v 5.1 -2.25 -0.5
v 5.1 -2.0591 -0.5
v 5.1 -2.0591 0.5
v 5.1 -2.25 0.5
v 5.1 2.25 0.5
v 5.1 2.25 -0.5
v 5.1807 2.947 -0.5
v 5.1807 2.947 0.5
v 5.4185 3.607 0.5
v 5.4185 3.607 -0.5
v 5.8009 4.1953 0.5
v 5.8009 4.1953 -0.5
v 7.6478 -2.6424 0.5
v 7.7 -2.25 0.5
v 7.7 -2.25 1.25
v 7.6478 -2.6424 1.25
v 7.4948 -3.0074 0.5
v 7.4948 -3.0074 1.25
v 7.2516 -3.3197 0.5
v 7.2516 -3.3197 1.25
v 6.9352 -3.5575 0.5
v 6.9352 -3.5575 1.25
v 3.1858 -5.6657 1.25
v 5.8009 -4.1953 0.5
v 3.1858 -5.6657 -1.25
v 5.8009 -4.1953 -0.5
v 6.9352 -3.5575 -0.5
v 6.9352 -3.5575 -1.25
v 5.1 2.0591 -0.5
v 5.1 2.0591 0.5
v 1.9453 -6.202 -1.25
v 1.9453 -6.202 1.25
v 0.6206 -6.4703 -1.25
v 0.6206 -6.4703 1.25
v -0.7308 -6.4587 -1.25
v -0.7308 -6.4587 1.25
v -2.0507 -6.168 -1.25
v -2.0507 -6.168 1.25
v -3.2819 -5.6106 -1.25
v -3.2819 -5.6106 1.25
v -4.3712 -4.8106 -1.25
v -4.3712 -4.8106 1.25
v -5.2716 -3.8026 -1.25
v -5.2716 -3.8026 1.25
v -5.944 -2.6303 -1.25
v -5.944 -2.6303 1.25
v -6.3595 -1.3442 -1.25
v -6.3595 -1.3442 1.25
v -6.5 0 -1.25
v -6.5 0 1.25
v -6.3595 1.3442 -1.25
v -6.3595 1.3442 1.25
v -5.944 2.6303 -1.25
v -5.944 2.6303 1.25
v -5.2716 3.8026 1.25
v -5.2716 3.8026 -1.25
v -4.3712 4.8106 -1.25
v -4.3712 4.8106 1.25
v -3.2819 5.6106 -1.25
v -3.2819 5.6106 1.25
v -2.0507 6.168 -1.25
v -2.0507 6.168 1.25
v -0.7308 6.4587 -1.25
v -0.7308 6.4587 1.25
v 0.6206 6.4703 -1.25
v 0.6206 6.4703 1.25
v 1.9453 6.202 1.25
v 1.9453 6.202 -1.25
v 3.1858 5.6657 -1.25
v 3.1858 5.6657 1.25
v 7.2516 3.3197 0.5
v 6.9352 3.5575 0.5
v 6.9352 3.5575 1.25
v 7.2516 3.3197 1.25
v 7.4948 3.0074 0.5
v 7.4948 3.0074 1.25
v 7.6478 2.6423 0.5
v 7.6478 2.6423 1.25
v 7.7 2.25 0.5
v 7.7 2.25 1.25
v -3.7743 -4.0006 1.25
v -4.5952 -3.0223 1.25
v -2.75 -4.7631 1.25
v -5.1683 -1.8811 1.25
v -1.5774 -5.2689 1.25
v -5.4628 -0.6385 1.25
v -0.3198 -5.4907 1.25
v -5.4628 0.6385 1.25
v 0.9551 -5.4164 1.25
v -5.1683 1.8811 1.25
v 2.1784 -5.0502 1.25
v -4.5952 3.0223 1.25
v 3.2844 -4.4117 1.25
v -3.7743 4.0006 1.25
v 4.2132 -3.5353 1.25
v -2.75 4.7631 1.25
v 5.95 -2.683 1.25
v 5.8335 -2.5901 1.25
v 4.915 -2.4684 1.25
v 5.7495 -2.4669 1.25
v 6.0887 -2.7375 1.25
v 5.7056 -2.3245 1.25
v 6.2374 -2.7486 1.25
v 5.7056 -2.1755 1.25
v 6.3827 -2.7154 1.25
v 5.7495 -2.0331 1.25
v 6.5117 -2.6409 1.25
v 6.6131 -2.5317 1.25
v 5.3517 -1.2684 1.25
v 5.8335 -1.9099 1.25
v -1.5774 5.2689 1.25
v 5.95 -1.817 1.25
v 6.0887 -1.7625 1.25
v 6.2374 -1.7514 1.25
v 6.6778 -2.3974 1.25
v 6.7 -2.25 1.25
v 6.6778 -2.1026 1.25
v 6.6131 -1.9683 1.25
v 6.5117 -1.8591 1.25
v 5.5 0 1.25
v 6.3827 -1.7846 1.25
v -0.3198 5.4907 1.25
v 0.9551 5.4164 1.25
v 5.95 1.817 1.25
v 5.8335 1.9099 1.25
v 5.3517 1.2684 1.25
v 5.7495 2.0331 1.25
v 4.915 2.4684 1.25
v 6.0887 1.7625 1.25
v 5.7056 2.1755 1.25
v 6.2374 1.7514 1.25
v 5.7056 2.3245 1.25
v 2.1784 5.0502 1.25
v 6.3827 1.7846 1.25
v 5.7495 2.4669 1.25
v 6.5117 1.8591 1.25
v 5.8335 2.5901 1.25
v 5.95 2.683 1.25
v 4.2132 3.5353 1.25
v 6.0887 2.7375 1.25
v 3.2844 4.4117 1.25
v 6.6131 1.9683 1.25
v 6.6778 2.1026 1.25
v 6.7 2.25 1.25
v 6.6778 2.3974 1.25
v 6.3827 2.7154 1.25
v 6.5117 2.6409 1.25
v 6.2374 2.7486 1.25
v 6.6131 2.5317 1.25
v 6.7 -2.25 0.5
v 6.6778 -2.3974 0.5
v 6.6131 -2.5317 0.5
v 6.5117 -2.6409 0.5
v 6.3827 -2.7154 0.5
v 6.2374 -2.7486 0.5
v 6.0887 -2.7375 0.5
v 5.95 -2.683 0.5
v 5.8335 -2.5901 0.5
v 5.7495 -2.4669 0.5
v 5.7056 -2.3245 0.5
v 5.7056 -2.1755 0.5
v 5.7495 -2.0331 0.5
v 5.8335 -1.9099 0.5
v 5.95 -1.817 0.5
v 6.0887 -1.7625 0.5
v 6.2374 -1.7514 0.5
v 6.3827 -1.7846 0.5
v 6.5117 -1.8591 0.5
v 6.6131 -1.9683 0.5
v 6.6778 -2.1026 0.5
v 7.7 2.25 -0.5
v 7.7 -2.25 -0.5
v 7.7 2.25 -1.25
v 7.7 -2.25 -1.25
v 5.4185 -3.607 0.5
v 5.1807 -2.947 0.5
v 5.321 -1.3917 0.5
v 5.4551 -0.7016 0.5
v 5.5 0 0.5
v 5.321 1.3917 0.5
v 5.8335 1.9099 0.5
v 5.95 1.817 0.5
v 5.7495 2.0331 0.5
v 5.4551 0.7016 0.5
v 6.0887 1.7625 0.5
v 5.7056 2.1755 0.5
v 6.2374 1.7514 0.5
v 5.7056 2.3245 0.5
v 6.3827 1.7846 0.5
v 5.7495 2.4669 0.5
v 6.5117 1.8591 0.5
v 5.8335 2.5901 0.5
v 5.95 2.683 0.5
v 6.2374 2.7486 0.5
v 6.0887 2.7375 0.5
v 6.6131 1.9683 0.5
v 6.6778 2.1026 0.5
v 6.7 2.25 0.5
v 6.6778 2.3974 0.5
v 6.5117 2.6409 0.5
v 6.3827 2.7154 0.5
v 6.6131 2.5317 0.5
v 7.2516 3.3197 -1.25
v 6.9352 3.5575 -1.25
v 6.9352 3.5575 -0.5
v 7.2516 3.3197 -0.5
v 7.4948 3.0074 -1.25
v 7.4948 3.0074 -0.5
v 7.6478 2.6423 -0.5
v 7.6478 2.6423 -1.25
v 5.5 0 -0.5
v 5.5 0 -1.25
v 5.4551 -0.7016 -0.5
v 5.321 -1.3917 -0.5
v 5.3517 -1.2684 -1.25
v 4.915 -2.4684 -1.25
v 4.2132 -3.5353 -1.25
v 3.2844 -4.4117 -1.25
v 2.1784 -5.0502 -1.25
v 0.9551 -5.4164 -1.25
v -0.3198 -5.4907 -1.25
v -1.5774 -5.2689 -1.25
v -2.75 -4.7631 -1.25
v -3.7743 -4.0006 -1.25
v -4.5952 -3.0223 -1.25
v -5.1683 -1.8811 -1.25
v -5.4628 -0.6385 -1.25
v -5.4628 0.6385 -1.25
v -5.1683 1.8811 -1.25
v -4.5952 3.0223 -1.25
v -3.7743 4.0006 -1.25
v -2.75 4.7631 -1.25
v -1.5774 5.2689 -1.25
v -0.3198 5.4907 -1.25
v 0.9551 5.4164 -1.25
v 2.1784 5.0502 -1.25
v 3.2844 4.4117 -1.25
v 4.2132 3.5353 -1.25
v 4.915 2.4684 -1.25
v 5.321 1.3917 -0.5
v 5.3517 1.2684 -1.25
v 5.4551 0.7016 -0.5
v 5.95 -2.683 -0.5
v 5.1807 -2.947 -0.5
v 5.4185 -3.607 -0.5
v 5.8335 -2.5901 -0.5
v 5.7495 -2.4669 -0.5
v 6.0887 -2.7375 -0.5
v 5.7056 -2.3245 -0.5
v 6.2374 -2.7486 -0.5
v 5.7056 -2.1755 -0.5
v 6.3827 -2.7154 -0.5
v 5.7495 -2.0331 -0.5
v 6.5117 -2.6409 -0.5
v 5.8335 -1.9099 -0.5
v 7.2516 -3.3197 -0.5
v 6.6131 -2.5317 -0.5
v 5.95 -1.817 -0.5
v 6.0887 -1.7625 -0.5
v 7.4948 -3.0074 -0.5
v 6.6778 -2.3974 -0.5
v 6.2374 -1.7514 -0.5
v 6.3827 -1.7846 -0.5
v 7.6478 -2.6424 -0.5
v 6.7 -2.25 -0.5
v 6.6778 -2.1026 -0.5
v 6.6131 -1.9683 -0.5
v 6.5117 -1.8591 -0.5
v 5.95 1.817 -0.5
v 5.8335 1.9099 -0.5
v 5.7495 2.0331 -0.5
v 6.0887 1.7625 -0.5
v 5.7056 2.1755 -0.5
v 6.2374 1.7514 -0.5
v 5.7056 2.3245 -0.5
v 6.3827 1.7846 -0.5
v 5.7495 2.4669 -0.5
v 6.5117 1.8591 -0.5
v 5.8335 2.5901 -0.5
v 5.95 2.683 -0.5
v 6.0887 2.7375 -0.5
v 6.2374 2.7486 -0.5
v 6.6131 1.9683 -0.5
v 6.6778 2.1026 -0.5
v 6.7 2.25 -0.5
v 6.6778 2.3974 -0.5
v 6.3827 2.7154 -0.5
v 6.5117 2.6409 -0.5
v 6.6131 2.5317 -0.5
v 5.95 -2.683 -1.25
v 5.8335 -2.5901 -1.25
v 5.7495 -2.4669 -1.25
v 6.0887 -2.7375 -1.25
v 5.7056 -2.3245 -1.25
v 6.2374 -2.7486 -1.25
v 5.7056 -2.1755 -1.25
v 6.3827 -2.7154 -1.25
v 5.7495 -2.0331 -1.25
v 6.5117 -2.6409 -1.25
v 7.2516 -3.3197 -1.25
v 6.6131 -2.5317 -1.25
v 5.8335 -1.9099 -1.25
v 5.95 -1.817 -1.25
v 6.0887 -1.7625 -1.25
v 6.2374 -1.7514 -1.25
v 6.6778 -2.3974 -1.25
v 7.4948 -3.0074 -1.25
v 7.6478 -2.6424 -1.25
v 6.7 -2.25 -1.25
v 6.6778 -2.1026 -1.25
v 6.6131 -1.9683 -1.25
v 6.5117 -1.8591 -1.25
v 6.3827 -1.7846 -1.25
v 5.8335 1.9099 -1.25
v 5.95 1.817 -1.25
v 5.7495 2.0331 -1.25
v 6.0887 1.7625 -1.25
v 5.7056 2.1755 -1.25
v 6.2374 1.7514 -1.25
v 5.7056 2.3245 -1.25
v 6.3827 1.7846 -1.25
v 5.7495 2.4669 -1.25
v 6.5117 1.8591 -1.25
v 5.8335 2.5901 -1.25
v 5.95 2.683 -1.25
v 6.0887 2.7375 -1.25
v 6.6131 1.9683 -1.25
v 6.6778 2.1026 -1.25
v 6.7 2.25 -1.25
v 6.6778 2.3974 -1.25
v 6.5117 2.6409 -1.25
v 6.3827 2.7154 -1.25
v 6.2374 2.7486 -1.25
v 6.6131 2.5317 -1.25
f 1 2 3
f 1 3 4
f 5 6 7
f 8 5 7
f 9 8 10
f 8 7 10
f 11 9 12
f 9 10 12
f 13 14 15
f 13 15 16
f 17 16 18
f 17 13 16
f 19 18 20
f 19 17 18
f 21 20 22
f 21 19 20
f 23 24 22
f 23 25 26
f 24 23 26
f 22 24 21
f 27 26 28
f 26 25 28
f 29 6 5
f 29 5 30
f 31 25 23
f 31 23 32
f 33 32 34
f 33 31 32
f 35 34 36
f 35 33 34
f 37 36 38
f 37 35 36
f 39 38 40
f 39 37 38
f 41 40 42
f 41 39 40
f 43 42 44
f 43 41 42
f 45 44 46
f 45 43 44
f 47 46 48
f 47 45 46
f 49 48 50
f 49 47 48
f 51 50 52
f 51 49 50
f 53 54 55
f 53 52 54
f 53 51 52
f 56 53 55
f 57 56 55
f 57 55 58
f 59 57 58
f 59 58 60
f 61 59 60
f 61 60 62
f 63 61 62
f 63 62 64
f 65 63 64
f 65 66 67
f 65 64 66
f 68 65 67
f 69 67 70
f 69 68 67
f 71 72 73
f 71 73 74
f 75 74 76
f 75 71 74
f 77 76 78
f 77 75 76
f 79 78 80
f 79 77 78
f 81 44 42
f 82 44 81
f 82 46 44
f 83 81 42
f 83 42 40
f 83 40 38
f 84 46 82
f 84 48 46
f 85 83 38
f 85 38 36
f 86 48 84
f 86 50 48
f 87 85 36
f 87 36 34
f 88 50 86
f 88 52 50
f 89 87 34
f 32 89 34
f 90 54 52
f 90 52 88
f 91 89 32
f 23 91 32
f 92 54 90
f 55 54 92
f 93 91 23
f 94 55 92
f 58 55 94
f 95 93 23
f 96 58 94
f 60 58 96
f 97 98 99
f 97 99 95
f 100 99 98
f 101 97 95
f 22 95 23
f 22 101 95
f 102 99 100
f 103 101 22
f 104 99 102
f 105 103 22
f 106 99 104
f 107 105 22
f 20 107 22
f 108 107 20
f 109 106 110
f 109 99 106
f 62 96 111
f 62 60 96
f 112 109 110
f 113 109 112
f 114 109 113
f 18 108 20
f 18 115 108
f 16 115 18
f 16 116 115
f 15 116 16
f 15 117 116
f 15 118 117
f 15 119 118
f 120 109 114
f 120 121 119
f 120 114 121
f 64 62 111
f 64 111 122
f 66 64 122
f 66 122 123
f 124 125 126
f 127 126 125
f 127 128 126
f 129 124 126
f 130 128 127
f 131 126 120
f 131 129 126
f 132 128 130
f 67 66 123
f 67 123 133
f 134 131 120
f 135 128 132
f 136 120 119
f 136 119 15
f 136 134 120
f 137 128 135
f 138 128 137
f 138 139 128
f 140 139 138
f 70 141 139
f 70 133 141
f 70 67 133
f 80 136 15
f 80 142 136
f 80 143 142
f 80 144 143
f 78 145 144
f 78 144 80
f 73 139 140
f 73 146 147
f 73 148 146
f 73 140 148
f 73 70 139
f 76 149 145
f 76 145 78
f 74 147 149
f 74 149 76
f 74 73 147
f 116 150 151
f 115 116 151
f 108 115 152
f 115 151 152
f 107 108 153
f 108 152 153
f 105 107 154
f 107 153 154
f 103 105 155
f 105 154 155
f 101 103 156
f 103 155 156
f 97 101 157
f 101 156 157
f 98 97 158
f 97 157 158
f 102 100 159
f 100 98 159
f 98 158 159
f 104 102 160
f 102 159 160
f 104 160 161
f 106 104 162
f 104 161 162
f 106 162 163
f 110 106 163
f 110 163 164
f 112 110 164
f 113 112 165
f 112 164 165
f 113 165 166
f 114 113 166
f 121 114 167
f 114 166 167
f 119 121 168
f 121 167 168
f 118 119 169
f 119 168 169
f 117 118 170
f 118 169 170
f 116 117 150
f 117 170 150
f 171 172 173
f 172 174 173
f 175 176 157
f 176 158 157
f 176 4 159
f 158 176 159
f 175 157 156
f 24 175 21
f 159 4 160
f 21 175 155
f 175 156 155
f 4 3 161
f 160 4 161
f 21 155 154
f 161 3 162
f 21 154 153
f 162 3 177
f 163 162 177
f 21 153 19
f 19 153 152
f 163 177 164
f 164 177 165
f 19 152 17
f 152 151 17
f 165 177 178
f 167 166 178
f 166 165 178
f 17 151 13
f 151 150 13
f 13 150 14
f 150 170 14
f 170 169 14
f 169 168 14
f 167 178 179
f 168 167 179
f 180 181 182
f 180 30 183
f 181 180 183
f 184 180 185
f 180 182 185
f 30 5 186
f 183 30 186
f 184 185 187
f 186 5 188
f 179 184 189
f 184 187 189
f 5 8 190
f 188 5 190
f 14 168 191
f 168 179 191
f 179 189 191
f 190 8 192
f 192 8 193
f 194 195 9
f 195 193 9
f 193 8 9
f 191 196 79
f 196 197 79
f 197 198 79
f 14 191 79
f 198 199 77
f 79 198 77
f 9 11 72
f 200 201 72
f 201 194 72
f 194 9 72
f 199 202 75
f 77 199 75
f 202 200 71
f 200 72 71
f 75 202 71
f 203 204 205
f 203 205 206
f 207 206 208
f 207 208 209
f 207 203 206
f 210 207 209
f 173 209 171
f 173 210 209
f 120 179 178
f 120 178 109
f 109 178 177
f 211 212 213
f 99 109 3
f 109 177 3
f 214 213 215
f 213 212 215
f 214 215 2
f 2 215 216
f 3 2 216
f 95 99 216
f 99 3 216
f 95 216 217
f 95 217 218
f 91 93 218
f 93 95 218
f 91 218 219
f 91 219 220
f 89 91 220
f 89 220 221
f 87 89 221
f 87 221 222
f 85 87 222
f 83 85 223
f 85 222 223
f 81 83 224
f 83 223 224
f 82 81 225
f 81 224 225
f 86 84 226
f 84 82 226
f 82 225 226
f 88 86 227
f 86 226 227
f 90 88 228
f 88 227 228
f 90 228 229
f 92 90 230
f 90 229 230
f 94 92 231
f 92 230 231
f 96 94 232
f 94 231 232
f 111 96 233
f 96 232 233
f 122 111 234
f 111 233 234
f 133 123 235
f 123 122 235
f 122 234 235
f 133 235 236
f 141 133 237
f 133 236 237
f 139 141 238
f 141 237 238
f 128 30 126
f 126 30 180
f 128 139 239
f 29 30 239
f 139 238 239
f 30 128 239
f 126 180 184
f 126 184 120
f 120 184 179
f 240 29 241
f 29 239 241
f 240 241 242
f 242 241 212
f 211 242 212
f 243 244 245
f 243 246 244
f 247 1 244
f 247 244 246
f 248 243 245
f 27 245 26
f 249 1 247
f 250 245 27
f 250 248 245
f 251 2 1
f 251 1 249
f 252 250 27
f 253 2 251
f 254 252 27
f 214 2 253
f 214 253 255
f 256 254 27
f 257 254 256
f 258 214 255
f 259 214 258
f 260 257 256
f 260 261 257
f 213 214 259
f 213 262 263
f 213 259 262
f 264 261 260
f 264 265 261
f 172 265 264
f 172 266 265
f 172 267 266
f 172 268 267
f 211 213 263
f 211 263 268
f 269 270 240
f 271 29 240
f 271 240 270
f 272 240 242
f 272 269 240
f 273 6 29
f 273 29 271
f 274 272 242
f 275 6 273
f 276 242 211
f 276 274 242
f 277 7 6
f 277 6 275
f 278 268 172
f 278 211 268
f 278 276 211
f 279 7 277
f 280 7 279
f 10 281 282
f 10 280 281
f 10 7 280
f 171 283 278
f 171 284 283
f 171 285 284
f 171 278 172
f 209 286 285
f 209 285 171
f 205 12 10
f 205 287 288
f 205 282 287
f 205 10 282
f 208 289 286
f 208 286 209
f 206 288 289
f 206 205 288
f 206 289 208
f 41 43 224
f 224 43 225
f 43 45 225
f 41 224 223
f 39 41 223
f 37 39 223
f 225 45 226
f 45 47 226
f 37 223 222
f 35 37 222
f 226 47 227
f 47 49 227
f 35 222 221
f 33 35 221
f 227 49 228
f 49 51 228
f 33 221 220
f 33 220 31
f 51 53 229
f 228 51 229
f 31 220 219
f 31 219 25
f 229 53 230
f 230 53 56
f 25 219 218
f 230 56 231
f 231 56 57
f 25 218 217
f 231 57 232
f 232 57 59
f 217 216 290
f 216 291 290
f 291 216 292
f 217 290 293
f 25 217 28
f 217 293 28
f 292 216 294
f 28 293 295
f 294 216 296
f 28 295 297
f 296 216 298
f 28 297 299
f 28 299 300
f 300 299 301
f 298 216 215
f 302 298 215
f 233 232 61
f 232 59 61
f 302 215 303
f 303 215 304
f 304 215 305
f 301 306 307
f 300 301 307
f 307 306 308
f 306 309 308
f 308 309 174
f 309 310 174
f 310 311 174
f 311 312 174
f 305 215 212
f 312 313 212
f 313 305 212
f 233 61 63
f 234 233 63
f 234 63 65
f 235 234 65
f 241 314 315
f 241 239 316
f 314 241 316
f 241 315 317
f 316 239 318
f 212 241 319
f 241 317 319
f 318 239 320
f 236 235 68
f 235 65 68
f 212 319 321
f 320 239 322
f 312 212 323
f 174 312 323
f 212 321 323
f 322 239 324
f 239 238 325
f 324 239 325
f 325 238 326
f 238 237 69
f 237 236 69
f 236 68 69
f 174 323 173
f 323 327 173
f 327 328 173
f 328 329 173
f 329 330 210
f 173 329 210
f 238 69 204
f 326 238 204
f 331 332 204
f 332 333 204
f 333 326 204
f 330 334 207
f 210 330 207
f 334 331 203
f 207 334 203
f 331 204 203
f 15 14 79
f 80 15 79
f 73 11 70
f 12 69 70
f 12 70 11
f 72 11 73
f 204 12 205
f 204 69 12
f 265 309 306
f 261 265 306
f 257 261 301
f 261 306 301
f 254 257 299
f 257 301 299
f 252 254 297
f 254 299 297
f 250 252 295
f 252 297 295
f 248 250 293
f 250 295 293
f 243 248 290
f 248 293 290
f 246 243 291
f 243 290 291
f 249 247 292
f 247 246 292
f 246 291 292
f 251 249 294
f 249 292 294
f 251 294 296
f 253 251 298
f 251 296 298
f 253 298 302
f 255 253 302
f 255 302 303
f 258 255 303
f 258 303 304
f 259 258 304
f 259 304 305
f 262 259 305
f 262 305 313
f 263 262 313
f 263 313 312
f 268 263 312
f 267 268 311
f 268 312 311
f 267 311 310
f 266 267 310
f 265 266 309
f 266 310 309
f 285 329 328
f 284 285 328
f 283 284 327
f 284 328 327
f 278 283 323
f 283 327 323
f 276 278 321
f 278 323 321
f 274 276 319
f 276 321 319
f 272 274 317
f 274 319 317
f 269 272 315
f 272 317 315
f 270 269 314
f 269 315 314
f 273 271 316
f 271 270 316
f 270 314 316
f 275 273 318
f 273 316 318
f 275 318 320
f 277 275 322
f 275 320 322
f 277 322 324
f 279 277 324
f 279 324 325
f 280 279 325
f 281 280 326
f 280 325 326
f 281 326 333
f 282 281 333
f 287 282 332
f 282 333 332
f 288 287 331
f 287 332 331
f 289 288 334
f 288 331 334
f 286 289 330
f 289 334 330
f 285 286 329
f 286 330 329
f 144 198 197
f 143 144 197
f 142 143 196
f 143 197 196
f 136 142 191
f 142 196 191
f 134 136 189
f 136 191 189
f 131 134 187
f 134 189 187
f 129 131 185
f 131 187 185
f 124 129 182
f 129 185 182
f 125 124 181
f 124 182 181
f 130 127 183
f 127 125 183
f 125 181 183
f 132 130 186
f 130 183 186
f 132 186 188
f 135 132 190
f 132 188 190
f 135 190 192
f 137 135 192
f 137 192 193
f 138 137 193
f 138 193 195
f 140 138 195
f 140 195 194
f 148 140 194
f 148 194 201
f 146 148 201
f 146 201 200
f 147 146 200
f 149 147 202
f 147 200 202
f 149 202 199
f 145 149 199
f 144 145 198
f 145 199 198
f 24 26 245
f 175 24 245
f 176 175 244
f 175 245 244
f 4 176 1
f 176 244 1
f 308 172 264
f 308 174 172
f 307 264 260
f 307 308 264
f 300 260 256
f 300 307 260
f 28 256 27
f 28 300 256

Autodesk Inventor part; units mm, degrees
ref_plane "YZ Plane" through (0, 0, 0) normal (1, 0, 0) x (0, 1, 0)
ref_plane "XZ Plane" through (0, 0, 0) normal (0, 1, 0) x (-1, 0, 0)
ref_plane "XY Plane" through (0, 0, 0) normal (0, 0, 1) x (1, 0, 0)
sketch "Sketch1" plane through (0, 0, 0) normal (0, 0, 1) x (1, 0, 0)
  circle A0 centre (0, 0) radius 5.5
  circle A1 centre (6.2, 2.25) radius 0.5
  circle A2 centre (6.2, -2.25) radius 0.5
  line L0 (0, 0) -> (12.1327, 0) construction
  arc A3 (7.7, 2.25) -> (6.9352, 3.5575) centre (6.2, 2.25) ccw
  arc A4 (6.9352, -3.5575) -> (7.7, -2.25) centre (6.2, -2.25) ccw
  line L1 (3.1858, 5.6657) -> (6.9352, 3.5575)
  line L2 (3.1858, -5.6657) -> (6.9352, -3.5575)
  line L3 (7.7, -2.25) -> (7.7, 2.25)
  arc A5 (3.1858, 5.6657) -> (3.1858, -5.6657) centre (0, 0) ccw
  dimension "d1" = 11
  dimension "d12" = 1
  dimension "d13" = 1
  dimension "d14" = 4.5
  dimension "d16" = 3
  dimension "d17" = 3
  dimension "d18" = 6.2
  dimension "d19" = 6.5
extrude "Extrusion1" add sketch "Sketch1" along normal mid plane 2.5
sketch "Sketch2" plane through (0, 0, 0) normal (0, 0, 1) x (1, 0, 0)
  circle A0 centre (6.2, 2.25) radius 0.5 projected
  circle A1 centre (6.2, -2.25) radius 0.5 projected
  line L0 (8.15, 2.25) -> (8.15, -2.25) construction
  line L1 (5.1, 2.25) -> (5.1, -2.25)
  line L2 (11.2, -2.25) -> (11.2, 2.25)
  arc A2 (11.2, 2.25) -> (5.1, 2.25) centre (8.15, 2.25) ccw
  arc A3 (5.1, -2.25) -> (11.2, -2.25) centre (8.15, -2.25) ccw
  point P0 (0, 0)
  point P1 (8.15, 0)
  dimension "d20" = 1.1
  dimension "d21" = 5
extrude "Extrusion2" cut sketch "Sketch2" along normal mid plane 1
properties part number "double spring swivel 7"
